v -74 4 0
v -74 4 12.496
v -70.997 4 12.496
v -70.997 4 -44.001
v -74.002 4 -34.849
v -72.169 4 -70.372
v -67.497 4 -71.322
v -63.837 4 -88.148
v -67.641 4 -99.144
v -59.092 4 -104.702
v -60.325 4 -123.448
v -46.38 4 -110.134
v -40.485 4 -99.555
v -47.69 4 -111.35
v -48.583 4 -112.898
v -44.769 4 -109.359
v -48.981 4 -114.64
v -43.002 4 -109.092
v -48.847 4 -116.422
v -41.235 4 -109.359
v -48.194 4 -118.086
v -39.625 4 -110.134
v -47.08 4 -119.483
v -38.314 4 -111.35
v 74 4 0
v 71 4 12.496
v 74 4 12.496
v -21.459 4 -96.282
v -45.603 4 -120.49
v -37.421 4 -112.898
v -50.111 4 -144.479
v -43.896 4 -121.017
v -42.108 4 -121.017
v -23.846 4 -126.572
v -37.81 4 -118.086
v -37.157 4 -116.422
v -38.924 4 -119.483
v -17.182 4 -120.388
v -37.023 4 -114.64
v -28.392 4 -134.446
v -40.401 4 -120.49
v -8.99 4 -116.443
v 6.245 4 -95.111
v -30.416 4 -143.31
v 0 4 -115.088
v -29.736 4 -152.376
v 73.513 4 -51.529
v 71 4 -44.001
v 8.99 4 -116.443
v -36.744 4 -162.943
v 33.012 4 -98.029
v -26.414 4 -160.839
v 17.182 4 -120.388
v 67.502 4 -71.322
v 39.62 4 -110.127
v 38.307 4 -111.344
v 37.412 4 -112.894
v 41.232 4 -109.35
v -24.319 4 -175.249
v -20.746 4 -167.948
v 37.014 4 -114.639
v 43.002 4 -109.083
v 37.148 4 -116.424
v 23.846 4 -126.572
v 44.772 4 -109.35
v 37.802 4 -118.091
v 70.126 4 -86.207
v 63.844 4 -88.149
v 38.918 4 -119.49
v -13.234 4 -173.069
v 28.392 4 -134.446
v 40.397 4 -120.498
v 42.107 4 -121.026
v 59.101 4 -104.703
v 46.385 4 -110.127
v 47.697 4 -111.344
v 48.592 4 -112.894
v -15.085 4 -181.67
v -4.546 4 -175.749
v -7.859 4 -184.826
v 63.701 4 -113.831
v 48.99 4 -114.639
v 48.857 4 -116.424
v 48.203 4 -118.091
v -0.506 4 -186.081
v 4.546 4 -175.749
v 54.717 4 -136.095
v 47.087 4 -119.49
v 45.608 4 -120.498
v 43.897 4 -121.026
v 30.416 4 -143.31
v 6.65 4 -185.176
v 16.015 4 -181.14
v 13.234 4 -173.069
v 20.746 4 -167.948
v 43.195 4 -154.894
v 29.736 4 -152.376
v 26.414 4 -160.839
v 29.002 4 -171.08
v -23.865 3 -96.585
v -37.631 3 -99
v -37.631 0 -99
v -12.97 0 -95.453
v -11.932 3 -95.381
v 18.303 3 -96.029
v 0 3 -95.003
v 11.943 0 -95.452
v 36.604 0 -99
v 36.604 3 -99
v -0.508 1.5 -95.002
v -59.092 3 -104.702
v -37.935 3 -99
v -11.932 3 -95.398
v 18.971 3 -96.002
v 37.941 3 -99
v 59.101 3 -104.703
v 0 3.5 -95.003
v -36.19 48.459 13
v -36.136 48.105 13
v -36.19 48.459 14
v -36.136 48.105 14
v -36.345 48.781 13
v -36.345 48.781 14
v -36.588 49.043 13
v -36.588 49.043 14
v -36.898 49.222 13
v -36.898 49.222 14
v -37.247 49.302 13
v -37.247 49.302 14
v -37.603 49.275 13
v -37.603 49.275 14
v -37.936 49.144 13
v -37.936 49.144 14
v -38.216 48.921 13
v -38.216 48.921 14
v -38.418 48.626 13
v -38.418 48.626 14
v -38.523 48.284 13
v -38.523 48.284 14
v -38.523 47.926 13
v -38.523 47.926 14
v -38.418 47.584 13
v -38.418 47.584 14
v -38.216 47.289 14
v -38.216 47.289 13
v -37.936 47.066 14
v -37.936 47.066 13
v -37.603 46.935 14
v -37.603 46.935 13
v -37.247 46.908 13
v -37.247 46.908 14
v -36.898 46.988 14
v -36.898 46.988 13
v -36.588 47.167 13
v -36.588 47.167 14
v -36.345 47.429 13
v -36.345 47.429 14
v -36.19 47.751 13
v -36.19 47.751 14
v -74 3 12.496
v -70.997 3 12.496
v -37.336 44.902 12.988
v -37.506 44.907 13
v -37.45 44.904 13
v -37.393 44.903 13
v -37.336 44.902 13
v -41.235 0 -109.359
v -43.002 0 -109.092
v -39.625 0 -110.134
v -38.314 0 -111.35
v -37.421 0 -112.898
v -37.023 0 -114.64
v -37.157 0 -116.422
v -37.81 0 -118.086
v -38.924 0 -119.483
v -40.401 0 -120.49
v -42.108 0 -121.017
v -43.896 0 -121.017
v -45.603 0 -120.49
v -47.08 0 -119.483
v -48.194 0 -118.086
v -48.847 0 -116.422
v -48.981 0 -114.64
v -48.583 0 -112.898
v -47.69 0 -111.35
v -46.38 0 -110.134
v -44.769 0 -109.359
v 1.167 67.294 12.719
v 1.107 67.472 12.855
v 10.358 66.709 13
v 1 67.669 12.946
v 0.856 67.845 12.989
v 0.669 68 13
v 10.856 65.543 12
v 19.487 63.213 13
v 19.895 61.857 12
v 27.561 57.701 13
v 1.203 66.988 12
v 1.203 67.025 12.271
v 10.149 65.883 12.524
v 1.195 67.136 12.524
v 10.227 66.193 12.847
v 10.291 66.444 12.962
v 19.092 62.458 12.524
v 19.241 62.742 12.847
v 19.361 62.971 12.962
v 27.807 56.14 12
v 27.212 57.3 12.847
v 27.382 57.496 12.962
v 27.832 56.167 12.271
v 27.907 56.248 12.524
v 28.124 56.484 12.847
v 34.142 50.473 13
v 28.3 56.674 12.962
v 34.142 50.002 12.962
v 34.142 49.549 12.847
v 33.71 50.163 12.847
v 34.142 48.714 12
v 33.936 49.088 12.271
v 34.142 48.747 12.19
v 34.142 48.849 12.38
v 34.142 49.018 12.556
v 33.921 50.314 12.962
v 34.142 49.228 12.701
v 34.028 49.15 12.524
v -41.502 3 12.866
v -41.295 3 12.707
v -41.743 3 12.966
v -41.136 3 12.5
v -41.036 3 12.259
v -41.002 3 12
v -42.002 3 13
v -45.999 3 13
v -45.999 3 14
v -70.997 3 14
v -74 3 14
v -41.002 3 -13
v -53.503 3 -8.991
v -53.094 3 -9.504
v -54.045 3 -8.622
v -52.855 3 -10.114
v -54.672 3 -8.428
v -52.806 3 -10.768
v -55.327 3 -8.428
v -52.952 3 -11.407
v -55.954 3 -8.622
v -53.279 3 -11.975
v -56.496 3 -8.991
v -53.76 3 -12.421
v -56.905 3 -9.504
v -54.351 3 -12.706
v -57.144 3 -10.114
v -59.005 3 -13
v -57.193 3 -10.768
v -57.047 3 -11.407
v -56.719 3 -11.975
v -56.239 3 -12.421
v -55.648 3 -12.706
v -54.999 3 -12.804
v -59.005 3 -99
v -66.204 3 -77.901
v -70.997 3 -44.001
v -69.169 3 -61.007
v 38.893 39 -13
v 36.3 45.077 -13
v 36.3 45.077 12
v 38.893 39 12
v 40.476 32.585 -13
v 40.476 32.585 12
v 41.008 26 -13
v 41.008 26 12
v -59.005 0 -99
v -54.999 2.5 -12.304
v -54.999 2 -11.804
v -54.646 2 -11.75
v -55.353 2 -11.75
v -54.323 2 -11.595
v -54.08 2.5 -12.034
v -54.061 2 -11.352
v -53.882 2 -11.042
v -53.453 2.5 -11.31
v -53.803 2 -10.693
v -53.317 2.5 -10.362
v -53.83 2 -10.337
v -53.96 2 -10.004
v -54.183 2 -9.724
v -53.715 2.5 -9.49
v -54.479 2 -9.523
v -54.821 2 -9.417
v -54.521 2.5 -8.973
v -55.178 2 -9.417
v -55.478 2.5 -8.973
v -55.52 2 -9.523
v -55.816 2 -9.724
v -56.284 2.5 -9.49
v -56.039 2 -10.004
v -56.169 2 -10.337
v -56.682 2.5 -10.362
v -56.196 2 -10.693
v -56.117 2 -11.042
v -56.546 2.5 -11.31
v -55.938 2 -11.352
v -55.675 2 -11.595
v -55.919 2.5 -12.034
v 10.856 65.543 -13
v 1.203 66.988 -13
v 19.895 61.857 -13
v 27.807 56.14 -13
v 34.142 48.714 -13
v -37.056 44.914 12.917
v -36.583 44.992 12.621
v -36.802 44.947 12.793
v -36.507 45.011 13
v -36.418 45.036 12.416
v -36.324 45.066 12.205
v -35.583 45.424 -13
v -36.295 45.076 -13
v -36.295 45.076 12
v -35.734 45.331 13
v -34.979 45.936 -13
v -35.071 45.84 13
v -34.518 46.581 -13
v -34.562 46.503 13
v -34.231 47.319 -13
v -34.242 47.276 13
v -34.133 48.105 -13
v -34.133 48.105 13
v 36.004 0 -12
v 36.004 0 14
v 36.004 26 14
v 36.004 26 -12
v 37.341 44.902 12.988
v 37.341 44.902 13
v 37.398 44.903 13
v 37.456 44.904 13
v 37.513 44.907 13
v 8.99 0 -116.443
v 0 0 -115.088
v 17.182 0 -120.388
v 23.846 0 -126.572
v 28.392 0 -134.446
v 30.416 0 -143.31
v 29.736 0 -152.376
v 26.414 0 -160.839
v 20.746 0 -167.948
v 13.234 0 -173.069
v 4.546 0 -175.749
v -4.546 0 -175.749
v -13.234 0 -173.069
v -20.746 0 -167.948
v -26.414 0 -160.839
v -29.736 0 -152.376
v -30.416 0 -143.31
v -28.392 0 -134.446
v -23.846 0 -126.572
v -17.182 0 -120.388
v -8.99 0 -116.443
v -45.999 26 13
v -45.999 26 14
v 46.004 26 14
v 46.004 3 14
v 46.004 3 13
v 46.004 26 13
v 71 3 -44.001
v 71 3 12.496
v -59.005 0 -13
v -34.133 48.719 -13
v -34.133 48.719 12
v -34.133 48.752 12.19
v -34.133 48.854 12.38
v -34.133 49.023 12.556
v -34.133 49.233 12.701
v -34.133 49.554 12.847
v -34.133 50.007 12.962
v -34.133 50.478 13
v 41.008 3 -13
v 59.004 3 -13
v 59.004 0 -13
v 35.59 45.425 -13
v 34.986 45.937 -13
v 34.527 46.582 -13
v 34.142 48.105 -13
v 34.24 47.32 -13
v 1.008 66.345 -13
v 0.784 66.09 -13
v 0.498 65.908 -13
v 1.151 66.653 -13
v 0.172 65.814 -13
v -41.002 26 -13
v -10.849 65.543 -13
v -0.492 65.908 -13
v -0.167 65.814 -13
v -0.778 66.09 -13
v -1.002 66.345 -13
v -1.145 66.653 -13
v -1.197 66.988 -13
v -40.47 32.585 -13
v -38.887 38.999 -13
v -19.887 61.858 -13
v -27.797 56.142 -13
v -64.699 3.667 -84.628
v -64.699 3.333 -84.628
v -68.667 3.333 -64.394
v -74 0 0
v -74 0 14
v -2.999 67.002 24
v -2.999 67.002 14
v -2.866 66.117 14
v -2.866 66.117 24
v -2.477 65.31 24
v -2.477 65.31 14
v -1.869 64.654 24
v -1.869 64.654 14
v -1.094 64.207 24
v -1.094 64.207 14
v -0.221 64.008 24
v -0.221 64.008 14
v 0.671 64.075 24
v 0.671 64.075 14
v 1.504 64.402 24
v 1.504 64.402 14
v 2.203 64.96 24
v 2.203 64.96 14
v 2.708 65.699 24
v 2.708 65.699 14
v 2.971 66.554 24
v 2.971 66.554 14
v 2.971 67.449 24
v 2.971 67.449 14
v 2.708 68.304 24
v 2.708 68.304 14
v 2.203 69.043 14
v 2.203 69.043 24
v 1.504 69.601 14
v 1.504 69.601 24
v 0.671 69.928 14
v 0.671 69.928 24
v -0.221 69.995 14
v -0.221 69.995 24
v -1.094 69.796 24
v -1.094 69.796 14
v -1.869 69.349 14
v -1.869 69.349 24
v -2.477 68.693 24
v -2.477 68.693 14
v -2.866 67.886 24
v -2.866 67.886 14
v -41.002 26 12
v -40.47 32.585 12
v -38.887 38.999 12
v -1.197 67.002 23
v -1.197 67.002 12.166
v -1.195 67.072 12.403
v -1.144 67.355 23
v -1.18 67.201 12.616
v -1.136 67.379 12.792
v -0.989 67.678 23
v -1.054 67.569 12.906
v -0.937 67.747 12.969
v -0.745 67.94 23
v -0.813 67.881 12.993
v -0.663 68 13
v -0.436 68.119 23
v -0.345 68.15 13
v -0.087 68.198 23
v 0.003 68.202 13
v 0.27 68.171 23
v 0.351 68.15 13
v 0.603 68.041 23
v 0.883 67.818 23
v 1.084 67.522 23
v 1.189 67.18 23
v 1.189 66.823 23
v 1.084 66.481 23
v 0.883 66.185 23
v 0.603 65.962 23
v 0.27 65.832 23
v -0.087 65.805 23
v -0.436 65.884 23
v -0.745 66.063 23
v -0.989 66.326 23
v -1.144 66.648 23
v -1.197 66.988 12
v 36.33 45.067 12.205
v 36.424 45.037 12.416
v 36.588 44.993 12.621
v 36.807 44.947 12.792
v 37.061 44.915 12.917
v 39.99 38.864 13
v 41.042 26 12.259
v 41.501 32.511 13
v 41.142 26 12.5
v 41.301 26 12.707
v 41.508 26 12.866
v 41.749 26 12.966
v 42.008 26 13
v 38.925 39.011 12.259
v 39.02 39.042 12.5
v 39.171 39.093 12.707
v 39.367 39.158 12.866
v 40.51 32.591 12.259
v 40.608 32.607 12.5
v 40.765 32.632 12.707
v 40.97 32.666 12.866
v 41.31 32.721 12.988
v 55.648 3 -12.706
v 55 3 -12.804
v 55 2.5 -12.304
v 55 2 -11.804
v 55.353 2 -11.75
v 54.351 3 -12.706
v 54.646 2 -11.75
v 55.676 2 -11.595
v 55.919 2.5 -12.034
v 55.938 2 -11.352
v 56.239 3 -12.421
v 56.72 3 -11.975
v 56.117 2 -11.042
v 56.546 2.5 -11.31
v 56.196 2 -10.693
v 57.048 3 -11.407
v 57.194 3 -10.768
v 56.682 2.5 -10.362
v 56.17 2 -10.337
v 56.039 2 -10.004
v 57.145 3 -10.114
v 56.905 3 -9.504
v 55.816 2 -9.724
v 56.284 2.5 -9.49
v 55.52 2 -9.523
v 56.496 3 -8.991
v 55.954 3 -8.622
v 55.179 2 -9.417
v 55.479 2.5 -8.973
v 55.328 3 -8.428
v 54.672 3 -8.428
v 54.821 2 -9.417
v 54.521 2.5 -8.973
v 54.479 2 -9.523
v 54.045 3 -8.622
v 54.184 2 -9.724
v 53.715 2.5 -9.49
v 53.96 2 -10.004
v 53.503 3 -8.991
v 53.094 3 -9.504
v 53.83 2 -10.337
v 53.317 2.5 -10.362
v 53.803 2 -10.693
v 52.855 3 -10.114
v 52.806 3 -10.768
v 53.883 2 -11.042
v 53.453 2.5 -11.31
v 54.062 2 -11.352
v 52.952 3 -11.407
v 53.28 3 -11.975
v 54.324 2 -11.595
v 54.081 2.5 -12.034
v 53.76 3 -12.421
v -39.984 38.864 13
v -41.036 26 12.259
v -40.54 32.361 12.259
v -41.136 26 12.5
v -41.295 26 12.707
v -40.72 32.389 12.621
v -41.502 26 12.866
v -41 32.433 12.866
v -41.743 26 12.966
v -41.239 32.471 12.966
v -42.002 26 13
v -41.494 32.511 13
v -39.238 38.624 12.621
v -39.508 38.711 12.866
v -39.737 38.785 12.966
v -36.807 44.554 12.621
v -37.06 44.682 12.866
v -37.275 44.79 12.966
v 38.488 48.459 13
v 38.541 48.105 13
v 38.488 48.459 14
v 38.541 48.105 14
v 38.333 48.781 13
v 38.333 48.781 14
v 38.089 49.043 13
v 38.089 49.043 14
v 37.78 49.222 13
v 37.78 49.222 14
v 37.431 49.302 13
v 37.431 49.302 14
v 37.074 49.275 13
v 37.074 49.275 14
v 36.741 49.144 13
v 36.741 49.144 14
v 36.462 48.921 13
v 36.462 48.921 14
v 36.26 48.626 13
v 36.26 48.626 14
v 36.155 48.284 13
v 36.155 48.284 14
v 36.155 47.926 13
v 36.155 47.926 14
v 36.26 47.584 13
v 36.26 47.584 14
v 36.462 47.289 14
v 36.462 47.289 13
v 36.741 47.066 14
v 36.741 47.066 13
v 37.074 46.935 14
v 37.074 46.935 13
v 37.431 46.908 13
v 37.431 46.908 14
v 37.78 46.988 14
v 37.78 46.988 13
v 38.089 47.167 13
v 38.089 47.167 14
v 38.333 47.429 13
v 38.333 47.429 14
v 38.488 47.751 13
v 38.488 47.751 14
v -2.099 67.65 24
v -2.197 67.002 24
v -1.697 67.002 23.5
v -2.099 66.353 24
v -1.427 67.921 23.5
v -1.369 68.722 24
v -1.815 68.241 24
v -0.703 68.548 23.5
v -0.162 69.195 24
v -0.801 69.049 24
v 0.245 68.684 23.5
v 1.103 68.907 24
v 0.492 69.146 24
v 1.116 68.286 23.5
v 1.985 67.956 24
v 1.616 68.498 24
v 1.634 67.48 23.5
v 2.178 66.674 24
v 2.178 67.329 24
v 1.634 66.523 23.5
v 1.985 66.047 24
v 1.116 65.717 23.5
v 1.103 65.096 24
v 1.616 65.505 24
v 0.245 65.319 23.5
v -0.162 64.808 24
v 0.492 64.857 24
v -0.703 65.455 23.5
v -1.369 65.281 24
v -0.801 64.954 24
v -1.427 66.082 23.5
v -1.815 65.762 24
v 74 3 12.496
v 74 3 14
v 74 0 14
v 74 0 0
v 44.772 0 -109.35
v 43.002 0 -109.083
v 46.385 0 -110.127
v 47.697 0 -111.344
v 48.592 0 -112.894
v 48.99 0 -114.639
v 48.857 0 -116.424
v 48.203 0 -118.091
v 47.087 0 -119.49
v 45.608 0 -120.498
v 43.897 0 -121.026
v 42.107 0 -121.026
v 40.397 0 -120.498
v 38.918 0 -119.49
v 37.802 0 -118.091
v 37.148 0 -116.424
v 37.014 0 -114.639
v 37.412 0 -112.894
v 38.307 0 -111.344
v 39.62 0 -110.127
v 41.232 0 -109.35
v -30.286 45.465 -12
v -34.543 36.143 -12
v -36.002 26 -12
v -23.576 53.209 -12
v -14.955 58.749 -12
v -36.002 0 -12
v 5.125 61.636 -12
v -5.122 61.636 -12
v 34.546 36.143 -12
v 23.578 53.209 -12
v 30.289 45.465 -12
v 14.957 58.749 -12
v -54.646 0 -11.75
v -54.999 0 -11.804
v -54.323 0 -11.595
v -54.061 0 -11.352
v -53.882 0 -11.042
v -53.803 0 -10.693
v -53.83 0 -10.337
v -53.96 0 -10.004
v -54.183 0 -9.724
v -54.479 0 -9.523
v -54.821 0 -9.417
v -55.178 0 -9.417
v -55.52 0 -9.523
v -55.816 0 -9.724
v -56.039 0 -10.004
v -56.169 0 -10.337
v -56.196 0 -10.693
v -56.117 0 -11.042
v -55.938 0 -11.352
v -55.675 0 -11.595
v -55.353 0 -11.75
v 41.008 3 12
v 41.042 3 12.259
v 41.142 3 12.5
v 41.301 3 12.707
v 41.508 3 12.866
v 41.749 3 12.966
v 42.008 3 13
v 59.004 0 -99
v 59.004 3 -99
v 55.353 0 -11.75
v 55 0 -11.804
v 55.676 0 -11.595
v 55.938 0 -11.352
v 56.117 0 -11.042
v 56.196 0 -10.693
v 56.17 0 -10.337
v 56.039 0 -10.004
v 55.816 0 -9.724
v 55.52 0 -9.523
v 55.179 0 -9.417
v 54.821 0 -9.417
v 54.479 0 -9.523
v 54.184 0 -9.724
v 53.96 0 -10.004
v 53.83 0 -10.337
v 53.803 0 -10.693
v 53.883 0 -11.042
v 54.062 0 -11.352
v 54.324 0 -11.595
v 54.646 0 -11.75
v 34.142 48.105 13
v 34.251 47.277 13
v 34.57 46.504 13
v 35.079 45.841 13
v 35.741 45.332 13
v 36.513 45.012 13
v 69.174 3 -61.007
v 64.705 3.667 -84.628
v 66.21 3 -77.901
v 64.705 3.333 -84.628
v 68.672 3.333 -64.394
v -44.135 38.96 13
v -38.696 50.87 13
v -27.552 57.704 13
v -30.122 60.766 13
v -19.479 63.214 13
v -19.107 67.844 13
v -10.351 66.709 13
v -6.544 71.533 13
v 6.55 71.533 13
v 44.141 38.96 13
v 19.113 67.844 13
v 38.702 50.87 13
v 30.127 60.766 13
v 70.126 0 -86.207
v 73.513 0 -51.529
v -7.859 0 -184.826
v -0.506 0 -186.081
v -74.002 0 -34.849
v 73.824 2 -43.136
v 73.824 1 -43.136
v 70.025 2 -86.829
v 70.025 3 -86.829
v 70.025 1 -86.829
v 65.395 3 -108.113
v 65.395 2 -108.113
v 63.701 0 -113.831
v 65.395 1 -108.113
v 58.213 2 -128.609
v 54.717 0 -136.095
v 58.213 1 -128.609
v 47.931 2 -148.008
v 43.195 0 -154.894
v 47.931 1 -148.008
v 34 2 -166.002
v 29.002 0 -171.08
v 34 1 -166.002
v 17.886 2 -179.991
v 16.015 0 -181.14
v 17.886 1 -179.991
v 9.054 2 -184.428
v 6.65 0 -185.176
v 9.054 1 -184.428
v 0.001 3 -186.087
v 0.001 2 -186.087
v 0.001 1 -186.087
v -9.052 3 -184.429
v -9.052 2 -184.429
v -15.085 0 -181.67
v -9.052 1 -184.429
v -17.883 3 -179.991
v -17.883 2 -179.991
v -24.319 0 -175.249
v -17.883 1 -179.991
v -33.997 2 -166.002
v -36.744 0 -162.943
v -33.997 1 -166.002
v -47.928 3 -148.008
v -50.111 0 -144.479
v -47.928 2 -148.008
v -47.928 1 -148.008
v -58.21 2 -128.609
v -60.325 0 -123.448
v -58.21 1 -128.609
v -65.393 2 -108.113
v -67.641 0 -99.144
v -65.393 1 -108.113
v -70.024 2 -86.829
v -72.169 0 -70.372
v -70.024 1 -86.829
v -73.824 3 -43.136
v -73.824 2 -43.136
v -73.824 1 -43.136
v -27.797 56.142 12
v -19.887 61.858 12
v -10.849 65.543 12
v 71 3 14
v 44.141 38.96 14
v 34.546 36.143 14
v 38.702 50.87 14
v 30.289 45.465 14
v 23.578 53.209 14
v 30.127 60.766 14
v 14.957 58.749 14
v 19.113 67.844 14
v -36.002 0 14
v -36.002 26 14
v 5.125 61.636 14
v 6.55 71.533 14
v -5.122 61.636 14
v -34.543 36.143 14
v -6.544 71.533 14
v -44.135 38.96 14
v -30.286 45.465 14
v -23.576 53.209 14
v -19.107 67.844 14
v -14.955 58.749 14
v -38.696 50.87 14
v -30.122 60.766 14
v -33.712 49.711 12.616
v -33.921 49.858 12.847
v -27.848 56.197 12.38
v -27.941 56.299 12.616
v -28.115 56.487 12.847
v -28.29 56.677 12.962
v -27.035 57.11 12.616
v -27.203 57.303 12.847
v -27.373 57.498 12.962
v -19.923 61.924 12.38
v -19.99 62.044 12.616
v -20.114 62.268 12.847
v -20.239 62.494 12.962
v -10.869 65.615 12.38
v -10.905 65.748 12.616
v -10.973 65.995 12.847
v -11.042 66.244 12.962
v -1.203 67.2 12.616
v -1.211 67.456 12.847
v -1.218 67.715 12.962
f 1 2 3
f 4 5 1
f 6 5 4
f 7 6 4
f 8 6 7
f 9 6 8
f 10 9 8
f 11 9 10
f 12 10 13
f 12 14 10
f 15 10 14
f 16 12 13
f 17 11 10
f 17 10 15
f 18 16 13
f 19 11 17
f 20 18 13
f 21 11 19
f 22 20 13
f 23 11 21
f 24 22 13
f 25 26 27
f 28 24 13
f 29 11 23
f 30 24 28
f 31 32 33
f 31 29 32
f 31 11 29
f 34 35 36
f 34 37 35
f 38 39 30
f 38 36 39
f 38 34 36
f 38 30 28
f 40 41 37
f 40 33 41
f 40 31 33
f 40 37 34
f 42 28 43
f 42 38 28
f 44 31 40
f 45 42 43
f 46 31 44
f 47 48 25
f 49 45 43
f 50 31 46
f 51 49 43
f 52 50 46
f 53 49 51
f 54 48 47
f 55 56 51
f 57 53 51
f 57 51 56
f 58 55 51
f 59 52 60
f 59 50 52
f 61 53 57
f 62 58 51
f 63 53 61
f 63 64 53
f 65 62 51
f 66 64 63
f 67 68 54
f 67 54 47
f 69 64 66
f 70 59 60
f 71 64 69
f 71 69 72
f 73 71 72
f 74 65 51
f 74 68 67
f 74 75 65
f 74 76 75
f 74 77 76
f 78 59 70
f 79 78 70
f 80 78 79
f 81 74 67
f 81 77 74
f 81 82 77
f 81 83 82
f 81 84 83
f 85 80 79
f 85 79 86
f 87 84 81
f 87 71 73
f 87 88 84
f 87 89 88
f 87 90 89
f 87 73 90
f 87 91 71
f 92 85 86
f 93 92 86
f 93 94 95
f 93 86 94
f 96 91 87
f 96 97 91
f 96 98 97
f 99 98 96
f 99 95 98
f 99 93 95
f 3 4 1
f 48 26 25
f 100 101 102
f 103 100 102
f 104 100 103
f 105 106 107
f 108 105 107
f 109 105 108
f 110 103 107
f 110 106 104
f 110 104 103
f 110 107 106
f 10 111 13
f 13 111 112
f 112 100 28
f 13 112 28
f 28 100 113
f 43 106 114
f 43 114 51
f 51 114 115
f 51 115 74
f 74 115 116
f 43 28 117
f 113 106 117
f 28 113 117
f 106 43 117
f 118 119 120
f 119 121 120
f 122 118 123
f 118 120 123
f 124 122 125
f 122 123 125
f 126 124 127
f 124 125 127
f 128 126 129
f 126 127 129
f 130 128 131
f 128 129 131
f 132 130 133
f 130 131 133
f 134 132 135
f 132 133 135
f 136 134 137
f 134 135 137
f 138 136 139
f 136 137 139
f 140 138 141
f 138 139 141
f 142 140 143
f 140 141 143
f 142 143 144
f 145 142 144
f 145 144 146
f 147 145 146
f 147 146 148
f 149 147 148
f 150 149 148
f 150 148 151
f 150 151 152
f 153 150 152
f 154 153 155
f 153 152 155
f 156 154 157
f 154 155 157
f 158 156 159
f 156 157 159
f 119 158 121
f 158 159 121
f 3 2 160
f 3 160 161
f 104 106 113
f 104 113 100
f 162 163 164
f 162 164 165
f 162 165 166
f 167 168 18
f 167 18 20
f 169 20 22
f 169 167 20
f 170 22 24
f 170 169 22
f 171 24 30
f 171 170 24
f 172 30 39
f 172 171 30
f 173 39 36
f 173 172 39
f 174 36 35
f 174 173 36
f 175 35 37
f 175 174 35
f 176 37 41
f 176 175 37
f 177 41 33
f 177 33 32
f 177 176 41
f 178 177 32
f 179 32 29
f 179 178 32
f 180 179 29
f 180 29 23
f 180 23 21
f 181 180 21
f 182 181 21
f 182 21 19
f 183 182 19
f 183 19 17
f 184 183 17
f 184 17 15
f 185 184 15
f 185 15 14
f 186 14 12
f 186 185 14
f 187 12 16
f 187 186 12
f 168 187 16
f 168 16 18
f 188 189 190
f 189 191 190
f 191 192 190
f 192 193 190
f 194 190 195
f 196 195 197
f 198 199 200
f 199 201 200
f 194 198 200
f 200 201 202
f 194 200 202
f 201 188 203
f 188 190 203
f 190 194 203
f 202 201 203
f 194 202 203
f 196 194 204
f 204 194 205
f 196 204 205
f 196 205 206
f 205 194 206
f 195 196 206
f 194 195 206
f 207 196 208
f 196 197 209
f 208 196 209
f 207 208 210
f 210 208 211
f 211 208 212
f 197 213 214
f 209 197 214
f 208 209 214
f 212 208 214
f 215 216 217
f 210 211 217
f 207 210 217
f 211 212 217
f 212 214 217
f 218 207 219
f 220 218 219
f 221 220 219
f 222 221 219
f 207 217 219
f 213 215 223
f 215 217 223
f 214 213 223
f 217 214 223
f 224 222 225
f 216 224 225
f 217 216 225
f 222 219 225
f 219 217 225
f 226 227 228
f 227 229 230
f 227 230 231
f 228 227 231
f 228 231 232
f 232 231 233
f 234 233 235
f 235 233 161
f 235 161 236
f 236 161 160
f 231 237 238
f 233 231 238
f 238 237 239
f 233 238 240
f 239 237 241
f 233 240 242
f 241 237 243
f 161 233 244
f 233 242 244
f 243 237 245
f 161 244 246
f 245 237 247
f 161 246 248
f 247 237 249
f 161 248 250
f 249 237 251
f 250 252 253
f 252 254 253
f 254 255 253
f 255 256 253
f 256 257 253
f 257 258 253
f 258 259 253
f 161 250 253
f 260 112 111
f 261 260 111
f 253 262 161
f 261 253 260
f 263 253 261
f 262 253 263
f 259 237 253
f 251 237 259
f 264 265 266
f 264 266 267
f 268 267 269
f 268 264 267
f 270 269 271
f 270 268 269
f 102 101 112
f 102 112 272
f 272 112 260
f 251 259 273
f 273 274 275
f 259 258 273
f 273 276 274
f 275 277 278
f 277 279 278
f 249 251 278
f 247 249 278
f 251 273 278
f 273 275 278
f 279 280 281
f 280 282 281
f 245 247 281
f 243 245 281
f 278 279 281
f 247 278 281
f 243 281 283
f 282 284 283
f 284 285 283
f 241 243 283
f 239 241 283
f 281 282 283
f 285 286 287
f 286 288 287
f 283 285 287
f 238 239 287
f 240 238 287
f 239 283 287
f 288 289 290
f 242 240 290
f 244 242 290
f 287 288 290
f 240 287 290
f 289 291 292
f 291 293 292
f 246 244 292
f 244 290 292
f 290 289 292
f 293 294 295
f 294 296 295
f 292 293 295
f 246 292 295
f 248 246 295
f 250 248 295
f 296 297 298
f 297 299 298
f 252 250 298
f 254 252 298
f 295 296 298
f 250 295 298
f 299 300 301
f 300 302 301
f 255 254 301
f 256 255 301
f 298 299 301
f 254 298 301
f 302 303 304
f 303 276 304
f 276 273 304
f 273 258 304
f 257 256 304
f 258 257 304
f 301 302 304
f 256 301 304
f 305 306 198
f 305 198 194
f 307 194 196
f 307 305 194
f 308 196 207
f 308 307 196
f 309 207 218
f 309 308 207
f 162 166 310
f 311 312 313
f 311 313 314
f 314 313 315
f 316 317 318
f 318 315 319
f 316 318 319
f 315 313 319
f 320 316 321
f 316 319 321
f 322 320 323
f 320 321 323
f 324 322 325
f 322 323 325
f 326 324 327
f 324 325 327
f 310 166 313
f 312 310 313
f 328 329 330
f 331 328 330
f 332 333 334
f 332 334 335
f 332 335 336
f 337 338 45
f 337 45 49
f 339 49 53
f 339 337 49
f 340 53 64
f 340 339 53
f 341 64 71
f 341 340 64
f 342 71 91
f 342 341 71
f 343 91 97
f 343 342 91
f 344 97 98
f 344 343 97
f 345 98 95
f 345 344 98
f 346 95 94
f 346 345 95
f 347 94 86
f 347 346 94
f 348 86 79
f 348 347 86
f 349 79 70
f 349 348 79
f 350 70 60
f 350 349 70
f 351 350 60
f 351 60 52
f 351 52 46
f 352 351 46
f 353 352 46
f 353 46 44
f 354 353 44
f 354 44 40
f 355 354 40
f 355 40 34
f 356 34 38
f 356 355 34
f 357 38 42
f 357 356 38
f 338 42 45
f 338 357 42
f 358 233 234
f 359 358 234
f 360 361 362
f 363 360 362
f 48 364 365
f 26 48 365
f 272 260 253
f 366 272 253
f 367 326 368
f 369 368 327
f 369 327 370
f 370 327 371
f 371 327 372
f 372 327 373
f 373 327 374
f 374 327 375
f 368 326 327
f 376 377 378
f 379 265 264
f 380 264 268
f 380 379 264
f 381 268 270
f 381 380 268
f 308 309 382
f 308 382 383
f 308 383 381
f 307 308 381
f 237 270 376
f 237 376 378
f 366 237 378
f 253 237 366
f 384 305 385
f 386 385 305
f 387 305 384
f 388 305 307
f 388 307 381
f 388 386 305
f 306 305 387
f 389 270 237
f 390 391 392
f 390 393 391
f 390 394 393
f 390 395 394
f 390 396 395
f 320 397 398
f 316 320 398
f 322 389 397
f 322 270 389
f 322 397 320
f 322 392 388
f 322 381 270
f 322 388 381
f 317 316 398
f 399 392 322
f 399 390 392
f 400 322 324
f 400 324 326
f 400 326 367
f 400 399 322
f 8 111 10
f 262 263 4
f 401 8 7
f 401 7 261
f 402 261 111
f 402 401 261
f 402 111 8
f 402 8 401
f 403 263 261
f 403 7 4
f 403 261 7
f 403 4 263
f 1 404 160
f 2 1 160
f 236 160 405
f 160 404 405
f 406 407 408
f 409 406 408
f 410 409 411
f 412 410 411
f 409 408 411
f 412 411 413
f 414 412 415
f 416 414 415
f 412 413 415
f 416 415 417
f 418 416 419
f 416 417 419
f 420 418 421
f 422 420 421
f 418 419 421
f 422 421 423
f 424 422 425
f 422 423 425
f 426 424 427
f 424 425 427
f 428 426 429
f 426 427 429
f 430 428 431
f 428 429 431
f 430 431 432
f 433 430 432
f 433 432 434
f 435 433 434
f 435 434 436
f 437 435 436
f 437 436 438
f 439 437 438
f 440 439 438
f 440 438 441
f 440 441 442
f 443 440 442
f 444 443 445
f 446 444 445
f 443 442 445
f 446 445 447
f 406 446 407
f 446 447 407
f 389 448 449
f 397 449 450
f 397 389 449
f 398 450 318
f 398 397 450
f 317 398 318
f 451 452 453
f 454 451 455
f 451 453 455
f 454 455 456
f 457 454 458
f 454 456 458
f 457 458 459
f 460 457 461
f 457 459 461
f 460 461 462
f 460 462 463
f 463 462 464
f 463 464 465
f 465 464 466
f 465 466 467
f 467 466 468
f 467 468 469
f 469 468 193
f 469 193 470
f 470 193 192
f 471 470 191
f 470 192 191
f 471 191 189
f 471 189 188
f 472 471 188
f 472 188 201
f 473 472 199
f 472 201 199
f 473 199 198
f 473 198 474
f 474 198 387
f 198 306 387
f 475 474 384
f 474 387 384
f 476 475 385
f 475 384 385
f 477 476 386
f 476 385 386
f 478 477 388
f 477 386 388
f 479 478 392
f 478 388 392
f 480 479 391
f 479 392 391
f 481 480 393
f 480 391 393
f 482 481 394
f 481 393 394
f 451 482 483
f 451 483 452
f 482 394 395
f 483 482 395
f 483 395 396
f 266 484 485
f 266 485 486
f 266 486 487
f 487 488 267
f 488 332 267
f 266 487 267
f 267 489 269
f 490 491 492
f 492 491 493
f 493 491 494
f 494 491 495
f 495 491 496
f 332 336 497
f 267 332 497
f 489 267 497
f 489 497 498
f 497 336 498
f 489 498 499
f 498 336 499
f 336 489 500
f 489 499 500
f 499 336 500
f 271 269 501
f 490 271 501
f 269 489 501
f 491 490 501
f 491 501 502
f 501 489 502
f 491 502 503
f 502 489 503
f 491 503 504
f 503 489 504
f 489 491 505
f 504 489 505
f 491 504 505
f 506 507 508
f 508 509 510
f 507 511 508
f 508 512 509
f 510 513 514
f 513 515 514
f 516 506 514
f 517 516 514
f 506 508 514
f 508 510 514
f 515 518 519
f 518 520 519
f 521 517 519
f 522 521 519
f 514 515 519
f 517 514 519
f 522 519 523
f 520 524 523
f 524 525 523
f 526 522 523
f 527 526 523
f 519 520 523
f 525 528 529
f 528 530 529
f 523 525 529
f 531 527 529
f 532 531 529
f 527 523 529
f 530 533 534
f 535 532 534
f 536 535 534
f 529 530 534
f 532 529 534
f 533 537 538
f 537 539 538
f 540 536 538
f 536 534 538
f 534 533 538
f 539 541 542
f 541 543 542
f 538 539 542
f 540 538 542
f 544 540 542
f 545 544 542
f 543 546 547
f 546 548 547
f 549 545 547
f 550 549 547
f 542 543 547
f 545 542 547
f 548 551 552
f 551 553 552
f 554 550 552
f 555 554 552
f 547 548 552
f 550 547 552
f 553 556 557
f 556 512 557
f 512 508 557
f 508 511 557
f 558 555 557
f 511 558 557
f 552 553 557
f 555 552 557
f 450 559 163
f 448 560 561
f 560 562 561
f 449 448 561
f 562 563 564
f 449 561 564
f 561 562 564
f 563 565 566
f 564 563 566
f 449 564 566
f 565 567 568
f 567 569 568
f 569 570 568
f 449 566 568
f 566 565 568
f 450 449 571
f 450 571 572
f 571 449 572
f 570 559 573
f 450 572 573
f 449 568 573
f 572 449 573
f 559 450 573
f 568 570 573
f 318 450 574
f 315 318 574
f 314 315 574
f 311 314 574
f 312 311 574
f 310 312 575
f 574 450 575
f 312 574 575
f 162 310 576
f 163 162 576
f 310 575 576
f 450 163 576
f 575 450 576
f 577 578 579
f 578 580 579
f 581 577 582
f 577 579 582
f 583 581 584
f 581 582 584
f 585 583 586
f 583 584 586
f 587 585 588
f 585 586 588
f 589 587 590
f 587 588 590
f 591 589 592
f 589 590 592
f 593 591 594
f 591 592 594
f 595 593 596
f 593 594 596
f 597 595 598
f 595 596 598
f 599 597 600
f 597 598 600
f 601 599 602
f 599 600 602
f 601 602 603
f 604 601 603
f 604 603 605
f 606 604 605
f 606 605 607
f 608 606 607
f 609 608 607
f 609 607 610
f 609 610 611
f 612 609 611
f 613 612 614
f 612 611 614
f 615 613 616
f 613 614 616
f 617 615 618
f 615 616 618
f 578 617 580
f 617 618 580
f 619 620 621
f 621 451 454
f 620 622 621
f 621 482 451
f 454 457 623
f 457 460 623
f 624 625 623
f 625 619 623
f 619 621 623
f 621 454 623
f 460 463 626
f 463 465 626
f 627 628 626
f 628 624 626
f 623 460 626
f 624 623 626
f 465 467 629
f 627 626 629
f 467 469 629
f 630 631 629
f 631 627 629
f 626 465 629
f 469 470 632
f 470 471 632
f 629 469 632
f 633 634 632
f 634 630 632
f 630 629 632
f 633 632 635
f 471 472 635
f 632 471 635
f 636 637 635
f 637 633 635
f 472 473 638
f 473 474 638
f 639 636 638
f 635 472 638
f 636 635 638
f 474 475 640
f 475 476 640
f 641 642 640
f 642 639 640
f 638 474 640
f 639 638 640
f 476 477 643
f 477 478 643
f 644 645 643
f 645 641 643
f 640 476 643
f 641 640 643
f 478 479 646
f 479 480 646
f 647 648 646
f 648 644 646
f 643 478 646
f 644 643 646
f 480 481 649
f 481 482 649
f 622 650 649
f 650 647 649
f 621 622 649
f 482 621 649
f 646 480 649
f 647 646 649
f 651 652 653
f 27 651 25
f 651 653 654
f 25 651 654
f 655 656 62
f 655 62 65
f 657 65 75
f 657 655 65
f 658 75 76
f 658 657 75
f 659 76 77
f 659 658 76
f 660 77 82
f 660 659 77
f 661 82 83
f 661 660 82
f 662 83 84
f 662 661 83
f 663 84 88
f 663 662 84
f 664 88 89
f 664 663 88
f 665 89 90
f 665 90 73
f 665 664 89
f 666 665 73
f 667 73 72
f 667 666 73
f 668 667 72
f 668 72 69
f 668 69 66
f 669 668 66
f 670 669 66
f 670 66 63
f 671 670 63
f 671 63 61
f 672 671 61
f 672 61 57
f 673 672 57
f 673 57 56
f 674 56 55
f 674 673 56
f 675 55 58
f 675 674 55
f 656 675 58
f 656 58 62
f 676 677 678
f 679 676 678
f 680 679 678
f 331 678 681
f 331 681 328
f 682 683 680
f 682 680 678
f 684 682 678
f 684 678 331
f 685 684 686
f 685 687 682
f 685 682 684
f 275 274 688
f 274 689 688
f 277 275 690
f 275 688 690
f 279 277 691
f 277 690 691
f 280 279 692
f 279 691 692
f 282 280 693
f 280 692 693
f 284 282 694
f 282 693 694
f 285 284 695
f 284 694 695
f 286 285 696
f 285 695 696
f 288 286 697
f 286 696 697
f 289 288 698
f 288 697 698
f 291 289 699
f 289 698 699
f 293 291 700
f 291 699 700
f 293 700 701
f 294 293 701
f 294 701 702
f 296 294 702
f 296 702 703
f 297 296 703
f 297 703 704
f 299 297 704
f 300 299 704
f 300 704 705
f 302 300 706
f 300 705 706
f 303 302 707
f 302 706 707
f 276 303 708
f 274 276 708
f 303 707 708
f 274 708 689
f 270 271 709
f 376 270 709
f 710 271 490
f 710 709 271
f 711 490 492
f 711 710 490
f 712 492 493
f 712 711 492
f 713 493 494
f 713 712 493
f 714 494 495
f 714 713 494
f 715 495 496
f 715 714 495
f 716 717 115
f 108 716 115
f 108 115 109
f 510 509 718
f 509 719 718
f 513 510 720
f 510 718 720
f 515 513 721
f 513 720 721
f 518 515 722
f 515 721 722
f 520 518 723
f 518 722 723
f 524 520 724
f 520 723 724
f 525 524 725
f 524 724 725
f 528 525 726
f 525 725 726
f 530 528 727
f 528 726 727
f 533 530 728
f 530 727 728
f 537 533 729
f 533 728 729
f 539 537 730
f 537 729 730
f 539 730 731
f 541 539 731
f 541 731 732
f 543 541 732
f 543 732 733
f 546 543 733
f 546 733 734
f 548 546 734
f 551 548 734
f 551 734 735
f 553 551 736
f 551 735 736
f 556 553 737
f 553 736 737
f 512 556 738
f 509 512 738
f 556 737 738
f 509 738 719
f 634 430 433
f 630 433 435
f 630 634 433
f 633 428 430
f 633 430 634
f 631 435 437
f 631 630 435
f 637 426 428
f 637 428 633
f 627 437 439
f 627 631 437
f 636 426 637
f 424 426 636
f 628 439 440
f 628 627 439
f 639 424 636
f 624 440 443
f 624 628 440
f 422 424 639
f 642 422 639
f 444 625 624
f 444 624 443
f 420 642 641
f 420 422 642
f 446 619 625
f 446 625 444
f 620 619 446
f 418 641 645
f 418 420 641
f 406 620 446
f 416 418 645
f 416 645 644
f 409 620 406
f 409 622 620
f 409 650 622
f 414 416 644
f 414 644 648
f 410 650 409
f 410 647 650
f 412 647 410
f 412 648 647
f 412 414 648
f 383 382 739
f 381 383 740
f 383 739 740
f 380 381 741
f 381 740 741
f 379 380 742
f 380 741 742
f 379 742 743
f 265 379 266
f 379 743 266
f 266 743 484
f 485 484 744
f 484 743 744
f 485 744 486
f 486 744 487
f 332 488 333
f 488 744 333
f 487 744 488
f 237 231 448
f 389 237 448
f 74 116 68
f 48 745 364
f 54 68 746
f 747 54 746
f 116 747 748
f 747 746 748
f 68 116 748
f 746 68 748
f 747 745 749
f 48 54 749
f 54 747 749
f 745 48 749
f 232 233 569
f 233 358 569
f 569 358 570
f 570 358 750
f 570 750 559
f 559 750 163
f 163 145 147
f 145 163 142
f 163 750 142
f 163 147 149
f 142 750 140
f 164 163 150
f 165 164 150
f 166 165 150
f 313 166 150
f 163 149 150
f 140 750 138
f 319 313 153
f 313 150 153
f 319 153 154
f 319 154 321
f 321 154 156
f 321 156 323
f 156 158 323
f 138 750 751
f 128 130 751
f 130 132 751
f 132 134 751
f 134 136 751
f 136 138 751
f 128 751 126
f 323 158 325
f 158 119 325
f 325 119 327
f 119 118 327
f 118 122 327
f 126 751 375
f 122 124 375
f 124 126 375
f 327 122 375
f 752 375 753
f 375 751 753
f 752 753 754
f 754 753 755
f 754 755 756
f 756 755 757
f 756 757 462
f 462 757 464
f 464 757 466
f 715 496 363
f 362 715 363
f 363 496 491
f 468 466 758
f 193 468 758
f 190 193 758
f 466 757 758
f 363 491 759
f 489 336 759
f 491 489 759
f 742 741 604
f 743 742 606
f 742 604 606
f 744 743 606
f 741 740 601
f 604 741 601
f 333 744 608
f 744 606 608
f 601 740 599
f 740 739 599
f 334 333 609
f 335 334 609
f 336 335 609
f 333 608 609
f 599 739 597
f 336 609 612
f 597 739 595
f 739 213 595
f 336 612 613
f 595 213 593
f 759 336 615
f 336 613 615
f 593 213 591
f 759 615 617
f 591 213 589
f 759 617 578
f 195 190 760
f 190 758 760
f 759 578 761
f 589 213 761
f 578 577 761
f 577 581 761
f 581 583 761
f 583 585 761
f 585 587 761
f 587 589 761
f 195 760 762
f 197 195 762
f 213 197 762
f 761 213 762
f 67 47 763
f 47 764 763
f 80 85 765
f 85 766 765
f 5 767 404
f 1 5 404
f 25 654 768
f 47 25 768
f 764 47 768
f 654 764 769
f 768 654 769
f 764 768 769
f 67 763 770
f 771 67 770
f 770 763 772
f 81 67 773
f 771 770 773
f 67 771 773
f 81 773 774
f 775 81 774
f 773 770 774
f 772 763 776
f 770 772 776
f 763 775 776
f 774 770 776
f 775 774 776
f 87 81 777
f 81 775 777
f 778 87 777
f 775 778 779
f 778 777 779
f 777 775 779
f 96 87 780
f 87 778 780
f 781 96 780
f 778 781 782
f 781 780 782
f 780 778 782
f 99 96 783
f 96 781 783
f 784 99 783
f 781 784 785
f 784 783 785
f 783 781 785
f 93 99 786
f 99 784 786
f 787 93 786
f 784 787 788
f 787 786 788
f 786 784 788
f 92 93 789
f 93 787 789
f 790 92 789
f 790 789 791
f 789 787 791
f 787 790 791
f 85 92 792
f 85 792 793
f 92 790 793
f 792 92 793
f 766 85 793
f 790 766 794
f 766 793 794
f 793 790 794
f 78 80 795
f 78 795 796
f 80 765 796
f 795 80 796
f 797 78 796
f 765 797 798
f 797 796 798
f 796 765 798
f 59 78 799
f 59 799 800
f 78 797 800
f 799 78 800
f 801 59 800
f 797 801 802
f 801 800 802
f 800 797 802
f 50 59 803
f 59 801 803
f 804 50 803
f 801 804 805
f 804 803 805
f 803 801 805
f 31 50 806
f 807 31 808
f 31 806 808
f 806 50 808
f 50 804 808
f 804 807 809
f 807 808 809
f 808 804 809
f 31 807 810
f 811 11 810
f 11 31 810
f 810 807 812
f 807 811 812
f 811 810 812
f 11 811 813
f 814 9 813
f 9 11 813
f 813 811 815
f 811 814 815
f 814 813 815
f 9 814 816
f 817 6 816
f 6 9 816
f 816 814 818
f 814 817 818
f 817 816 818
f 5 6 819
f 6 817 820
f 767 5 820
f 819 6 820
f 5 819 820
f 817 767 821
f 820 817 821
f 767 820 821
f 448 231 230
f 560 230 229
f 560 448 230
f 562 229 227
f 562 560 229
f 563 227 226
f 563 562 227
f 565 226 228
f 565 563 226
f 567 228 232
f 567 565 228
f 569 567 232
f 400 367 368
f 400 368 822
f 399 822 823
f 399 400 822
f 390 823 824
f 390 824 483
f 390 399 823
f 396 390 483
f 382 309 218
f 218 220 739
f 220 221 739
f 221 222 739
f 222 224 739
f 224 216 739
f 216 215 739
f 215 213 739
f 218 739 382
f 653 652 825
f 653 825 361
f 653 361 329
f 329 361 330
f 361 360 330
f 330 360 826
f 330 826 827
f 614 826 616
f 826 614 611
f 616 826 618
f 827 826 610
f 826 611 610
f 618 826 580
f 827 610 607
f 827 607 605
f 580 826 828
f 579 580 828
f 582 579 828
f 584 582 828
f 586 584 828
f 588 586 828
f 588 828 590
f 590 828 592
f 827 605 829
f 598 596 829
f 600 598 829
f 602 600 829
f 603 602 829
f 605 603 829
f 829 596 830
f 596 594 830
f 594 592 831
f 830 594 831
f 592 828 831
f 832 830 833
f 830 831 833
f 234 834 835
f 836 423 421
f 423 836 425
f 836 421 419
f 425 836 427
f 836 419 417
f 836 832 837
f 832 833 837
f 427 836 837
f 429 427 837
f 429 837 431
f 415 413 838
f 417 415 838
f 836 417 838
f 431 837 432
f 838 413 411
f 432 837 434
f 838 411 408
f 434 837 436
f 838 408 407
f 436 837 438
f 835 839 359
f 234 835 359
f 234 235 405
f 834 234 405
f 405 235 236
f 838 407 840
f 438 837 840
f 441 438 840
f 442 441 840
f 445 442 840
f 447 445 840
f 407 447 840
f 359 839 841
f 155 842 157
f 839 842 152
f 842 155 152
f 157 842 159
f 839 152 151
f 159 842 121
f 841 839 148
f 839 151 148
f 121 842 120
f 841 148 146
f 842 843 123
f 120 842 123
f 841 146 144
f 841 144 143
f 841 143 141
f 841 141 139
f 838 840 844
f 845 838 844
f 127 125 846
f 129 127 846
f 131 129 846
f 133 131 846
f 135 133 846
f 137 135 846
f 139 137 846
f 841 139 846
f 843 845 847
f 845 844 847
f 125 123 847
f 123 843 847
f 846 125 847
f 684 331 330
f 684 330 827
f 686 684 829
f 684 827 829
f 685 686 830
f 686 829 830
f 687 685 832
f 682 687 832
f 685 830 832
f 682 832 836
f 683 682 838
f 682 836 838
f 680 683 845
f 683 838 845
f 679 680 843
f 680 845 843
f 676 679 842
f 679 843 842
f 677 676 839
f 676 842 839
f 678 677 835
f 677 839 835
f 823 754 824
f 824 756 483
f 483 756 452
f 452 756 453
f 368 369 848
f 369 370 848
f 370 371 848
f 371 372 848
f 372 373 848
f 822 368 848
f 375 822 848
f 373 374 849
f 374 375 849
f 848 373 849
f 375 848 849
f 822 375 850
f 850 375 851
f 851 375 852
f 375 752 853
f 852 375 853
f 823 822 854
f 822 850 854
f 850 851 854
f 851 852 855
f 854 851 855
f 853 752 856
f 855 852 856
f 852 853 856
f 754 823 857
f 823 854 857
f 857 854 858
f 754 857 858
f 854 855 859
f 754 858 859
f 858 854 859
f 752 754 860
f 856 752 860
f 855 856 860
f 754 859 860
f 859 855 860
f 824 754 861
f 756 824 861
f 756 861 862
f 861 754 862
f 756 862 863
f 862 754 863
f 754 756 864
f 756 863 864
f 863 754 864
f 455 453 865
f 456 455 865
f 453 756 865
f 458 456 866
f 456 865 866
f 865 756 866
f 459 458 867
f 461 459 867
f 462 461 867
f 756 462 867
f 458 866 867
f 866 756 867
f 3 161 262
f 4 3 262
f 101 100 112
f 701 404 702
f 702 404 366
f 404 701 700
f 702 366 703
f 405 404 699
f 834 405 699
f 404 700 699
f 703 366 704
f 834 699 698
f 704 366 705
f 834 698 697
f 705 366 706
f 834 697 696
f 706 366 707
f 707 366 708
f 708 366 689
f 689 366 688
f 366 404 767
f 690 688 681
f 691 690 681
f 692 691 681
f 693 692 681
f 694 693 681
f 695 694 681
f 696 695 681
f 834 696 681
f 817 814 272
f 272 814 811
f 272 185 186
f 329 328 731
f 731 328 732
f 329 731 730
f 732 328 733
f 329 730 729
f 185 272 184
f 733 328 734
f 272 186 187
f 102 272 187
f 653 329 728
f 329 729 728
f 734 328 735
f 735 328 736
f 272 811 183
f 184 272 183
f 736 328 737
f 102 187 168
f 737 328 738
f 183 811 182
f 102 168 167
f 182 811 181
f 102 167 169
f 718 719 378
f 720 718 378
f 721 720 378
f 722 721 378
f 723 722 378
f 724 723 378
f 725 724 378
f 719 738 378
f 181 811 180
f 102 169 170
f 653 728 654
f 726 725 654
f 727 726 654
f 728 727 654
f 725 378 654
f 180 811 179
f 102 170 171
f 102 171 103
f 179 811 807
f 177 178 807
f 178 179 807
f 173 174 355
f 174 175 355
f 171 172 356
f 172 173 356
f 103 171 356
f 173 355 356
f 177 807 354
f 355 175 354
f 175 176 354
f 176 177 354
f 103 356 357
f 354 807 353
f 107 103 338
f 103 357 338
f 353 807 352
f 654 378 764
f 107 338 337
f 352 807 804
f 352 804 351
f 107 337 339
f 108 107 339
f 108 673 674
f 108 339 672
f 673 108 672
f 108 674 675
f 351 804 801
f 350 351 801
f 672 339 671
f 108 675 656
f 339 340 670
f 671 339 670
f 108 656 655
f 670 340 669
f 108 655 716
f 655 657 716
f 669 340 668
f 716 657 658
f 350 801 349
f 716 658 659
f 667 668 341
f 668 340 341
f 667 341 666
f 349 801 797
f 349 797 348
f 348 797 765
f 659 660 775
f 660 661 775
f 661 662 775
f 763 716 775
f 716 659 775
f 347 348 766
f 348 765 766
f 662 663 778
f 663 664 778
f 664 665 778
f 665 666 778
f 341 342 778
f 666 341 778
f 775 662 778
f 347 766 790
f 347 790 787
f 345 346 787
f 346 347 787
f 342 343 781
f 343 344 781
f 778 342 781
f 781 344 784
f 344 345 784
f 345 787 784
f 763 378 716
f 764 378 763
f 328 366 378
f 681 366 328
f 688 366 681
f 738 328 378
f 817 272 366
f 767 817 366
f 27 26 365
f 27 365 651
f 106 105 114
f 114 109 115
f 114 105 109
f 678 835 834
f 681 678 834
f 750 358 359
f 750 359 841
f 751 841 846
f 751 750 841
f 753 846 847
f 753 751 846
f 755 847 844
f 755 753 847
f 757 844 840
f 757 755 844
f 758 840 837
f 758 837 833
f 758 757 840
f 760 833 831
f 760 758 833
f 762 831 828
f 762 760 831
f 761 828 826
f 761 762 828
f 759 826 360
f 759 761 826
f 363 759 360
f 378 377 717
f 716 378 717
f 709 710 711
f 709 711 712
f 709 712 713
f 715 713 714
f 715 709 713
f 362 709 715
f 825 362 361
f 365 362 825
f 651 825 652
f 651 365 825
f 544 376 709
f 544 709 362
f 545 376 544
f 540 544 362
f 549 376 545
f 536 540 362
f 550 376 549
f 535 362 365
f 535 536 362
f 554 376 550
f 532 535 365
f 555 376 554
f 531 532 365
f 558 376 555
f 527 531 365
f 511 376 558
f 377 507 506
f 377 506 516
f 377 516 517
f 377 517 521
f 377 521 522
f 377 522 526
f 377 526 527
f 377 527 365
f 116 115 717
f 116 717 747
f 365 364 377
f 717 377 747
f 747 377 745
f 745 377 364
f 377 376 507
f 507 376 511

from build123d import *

# Parameters (mm, degrees)
SKETCH3_R                                            = 30.500804908
SKETCH3_R_2                                          = 5.995731032
SKETCH3_R_3                                          = 6.004912971
BOSS_EXTRUDE1_DEPTH                                  = 4
CUT_EXTRUDE1_DEPTH                                   = 201.334085664
CUT_EXTRUDE1_DEPTH_BACK                              = 1
CUT_EXTRUDE2_DEPTH                                   = 10
BOSS_EXTRUDE2_DEPTH                                  = 23
SKETCH8_W                                            = 46.001518713
SKETCH8_H                                            = 27
REVOLVE1_ANGLE                                       = 180
CUT_EXTRUDE3_DEPTH                                   = 26
FILLET1_R                                            = 1
CSK_FOR_M2_COUNTERSUNK_RAISED_HEAD_SCREW_D           = 2.4
CSK_FOR_M2_COUNTERSUNK_RAISED_HEAD_SCREW_CSINK_D     = 4.4
CSK_FOR_M2_COUNTERSUNK_RAISED_HEAD_SCREW_CSINK_ANGLE = 90
CSK_FOR_M2_COUNTERSUNK_RAISED_HEAD_S_2_D             = 2.4
CSK_FOR_M2_COUNTERSUNK_RAISED_HEAD_S_2_CSINK_D       = 4.4
CSK_FOR_M2_COUNTERSUNK_RAISED_HEAD_S_2_CSINK_ANGLE   = 90
CUT_EXTRUDE4_DEPTH                                   = 26
CUT_EXTRUDE6_DEPTH                                   = 26
CSK_FOR_M2_COUNTERSUNK_RAISED_HEAD_S_3_D             = 2.4
CSK_FOR_M2_COUNTERSUNK_RAISED_HEAD_S_3_CSINK_D       = 4.4
CSK_FOR_M2_COUNTERSUNK_RAISED_HEAD_S_3_CSINK_ANGLE   = 90
SKETCH21_W                                           = 3.203626312
SKETCH21_H                                           = 1.504144349
SKETCH21_W_2                                         = 3.379717773
CUT_EXTRUDE7_DEPTH                                   = 1
SKETCH26_R                                           = 3.001958304
BOSS_EXTRUDE4_DEPTH                                  = 10
CSK_FOR_M2_COUNTERSUNK_FLAT_HEAD_SCREW1_D            = 2.4
CSK_FOR_M2_COUNTERSUNK_FLAT_HEAD_SCREW1_CSINK_D      = 4.4
CSK_FOR_M2_COUNTERSUNK_FLAT_HEAD_SCREW1_CSINK_ANGLE  = 90


with BuildPart() as part:
    # Sketch3 → Boss-Extrude1 (new body)
    with BuildSketch(Plane(origin=(0, 0, 0), x_dir=(1, 0, 0), z_dir=(0, 1, 0))):
        with BuildLine():
            Line((-74, 0), (-74, -13.999975782))
            Line((-74, -13.999975782), (74, -13.999975782))
            Line((74, -13.999975782), (74, 0))
            add(Edge.make_bspline(
                [(74, 0), (74.231196296, 56.043971303), (77.023704063, 134.891433867), (0.000522637, 195.647038294), (-77.018807985, 134.889235124), (-74.23221909, 56.044664754), (-74, 0)],
                knots=[0, 0, 0, 0, 0.406629726, 0.500002159, 0.593368057, 1, 1, 1, 1], degree=3))
        make_face()
        with Locations(Location((0, 145.588967501, 0), (0, 0, 270))):
            Circle(SKETCH3_R, mode=Mode.SUBTRACT)
        with Locations(Location((-43.002039148, 115.088162593, 0), (0, 0, 270))):
            Circle(SKETCH3_R_2, mode=Mode.SUBTRACT)
        with Locations(Location((43.002259074, 115.088162593, 0), (0, 0, 270))):
            Circle(SKETCH3_R_3, mode=Mode.SUBTRACT)
    extrude(amount=BOSS_EXTRUDE1_DEPTH)

    # Sketch4 → Cut-Extrude1 (cut, two sides: drawn at the far end of the back side and taken through both)
    with BuildSketch(Plane(origin=(0, 4, 0), x_dir=(1, 0, 0), z_dir=(0, 1, 0)).offset(-CUT_EXTRUDE1_DEPTH_BACK)):
        with BuildLine():
            Line((71.000110633, 44.001091932), (71.000110633, 6.067137952))
            Line((71.000110633, 6.067137952), (71.000110633, 5.938211201))
            Line((71.000110633, 5.938211201), (71.000110633, -16.998704323))
            Line((71.000110633, -16.998704323), (-70.996716676, -16.998704323))
            Line((-70.996716676, -16.998704323), (-70.996716676, 6.002699648))
            Line((-70.996716676, 6.002699648), (-70.996716676, 44.001117001))
            add(Edge.make_bspline(
                [(-59.092437552, 104.701767127), (-65.518680916, 84.707719391), (-69.486773958, 64.474169348), (-70.996716676, 44.001117001)],
                knots=[0.003076868, 0.003076868, 0.003076868, 0.003076868, 0.620649816, 0.620649816, 0.620649816, 0.620649816], degree=3))
            add(Edge.make_bspline(
                [(-59.092437552, 104.701767127), (-39.394984135, 98.235957793), (0.002749603, 91.769378921), (39.400586429, 98.235612751), (59.100918302, 104.702616137)],
                knots=[0.007529078, 0.007529078, 0.007529078, 0.007529078, 0.499976084, 0.992492475, 0.992492475, 0.992492475, 0.992492475], degree=3))
            add(Edge.make_bspline(
                [(59.100918302, 104.702616137), (65.524413648, 84.70806856), (69.490811091, 64.474227159), (71.000110633, 44.001091932)],
                knots=[0.003067815, 0.003067815, 0.003067815, 0.003067815, 0.620645861, 0.620645861, 0.620645861, 0.620645861], degree=3))
        make_face()
    extrude(amount=CUT_EXTRUDE1_DEPTH + CUT_EXTRUDE1_DEPTH_BACK, mode=Mode.SUBTRACT)

    # Sketch5 → Cut-Extrude2 (cut)
    with BuildSketch(Plane(origin=(0, 3, 0), x_dir=(1, 0, 0), z_dir=(0, 1, 0))):
        with BuildLine():
            Line((-37.63115667, 99.000024218), (-59.004553183, 99.000024218))
            Line((-59.004553183, 99.000024218), (-59.004553183, 13.000024218))
            Line((-59.004553183, 13.000024218), (59.003956031, 13.000024218))
            Line((59.003956031, 13.000024218), (59.003956031, 99.000024218))
            Line((59.003956031, 99.000024218), (36.603722574, 99.000024218))
            add(Edge.make_bspline(
                [(-37.63115667, 99.000024218), (-0.501932399, 91.00364322), (36.603722574, 99.000024218)],
                knots=[0, 0, 0, 1, 1, 1], degree=2))
        make_face()
    extrude(amount=-CUT_EXTRUDE2_DEPTH, mode=Mode.SUBTRACT)

    # Sketch7 → Boss-Extrude2 (add)
    with BuildSketch(Plane(origin=(0, 3, 0), x_dir=(1, 0, 0), z_dir=(0, 1, 0))):
        Polygon((-0.000298576, 13.000024218), (-45.998654577, 13.000024218), (-45.998654577, -13.999975782), (0.001696979, -13.999975782), (46.00438285, -13.999975782), (46.00438285, 13.000024218), align=None)
    extrude(amount=BOSS_EXTRUDE2_DEPTH)

    # Sketch8 → Revolve1 (revolve)
    with BuildSketch(Plane(origin=(0, 26, 0), x_dir=(1, 0, 0), z_dir=(0, 1, 0))):
        with Locations((-22.997895221, -0.499975782)):
            Rectangle(SKETCH8_W, SKETCH8_H)
    revolve(axis=Axis((0.002864136, 26, -13.000024218), (0, 0, -1)), revolution_arc=REVOLVE1_ANGLE)

    # Sketch9 → Cut-Extrude3 (cut)
    with BuildSketch(Plane(origin=(0, 0, -13.000024218), x_dir=(-1, 0, 0), z_dir=(0, 0, -1))):
        with BuildLine():
            Line((-46.00438285, 4), (-46.00438285, 26))
            ThreePointArc((-46.00438285, 26), (-0.002864136, 72.001518714), (45.998654577, 26))
            Line((45.998654577, 26), (45.998654577, 4))
            Line((45.998654577, 4), (45.998654577, 3))
            Line((45.998654577, 3), (41.002011799, 3))
            Line((41.002011799, 3), (41.002011799, 4))
            Line((41.002011799, 4), (41.002011799, 26))
            ThreePointArc((41.002011799, 26), (-0.003137153, 67.005148952), (-41.008286105, 26))
            Line((-41.008286105, 26), (-41.008286105, 4))
            Line((-41.008286105, 4), (-41.008286105, 3))
            Line((-41.008286105, 3), (-46.00438285, 3))
            Line((-46.00438285, 3), (-46.00438285, 4))
        make_face()
    extrude(amount=-CUT_EXTRUDE3_DEPTH, mode=Mode.SUBTRACT)

    # Fillet1
    fillet1_edges = [part.edges().sort_by_distance(p)[0] for p in [
        (41.008286105, 14.5, 12.999975782),
        (0.003137153, 67.005148952, 12.999975782),
        (-41.002011799, 14.5, 12.999975782),
    ]]
    fillet(fillet1_edges, radius=FILLET1_R)

    # CSK for M2 Countersunk Raised Head Screw (through all)
    with Locations(Plane(origin=(37.341283937, 48.105109247, -13.000024218), x_dir=(-1, 0, 0), z_dir=(0, 0, -1))):
        with Locations((0, 0)):
            CounterSinkHole(CSK_FOR_M2_COUNTERSUNK_RAISED_HEAD_SCREW_D / 2, CSK_FOR_M2_COUNTERSUNK_RAISED_HEAD_SCREW_CSINK_D / 2, counter_sink_angle=CSK_FOR_M2_COUNTERSUNK_RAISED_HEAD_SCREW_CSINK_ANGLE)

    # CSK for M2 Countersunk Raised Head S 2 (through all)
    with Locations(Plane(origin=(-37.336467168, 48.105109247, -13.000024218), x_dir=(-1, 0, 0), z_dir=(0, 0, -1))):
        with Locations((0, 0)):
            CounterSinkHole(CSK_FOR_M2_COUNTERSUNK_RAISED_HEAD_S_2_D / 2, CSK_FOR_M2_COUNTERSUNK_RAISED_HEAD_S_2_CSINK_D / 2, counter_sink_angle=CSK_FOR_M2_COUNTERSUNK_RAISED_HEAD_S_2_CSINK_ANGLE)

    # Sketch13 → Cut-Extrude4 (cut)
    with BuildSketch(Plane(origin=(0, 0, 12.999975782), x_dir=(-1, 0, 0), z_dir=(0, 0, -1))):
        with BuildLine():
            Line((-40.537082061, 48.105109247), (-40.537082061, 50.119729722))
            Line((-40.537082061, 50.119729722), (-34.142461411, 57.934379624))
            Line((-34.142461411, 57.934379624), (-34.142461411, 48.105109247))
            ThreePointArc((-34.142461411, 48.105109247), (-35.078534783, 45.841172076), (-37.341283937, 44.902230579))
            ThreePointArc((-37.341283937, 44.902230579), (-39.602520891, 45.84179845), (-40.537082061, 48.105109247))
        make_face()
        with BuildLine():
            Line((34.132951582, 48.105109247), (34.132951582, 58.567156979))
            Line((34.132951582, 58.567156979), (40.534839533, 50.980581359))
            Line((40.534839533, 50.980581359), (40.534839533, 48.105109247))
            ThreePointArc((40.534839533, 48.105109247), (39.59899119, 45.841265256), (37.336467022, 44.902230579))
            ThreePointArc((37.336467022, 44.902230579), (35.070804229, 45.839632847), (34.132951582, 48.105109247))
        make_face()
    extrude(amount=CUT_EXTRUDE4_DEPTH, mode=Mode.SUBTRACT)

    # Sketch14 → Cut-Extrude6 (cut)
    with BuildSketch(Plane.XY.offset(13.999975782)):
        with BuildLine():
            Line((-36.001614282, 3), (-36.001614282, -2.003280718))
            Line((-36.001614282, -2.003280718), (36.004124987, -2.003280718))
            Line((36.004124987, -2.003280718), (36.004124987, 3))
            Line((36.004124987, 3), (36.004124987, 26))
            ThreePointArc((36.004124987, 26), (0.001255352, 62.002869635), (-36.001614282, 26))
            Line((-36.001614282, 26), (-36.001614282, 3))
        make_face()
    extrude(amount=-CUT_EXTRUDE6_DEPTH, mode=Mode.SUBTRACT)

    # CSK for M2 Countersunk Raised Head S 3 (through all)
    with Locations(Plane(origin=(-54.999469482, 3, -10.603702266), x_dir=(0, 0, 1), z_dir=(0, 1, 0))):
        with Locations((0, 0), (0, 109.999191574)):
            CounterSinkHole(CSK_FOR_M2_COUNTERSUNK_RAISED_HEAD_S_3_D / 2, CSK_FOR_M2_COUNTERSUNK_RAISED_HEAD_S_3_CSINK_D / 2, counter_sink_angle=CSK_FOR_M2_COUNTERSUNK_RAISED_HEAD_S_3_CSINK_ANGLE)

    # Sketch21 → Cut-Extrude7 (cut)
    with BuildSketch(Plane(origin=(0, 4, 0), x_dir=(1, 0, 0), z_dir=(0, 1, 0))):
        with Locations((-72.598529832, -13.247903608)):
            Rectangle(SKETCH21_W, SKETCH21_H)
        with Locations((72.68996952, -13.247903608)):
            Rectangle(SKETCH21_W_2, SKETCH21_H)
    extrude(amount=-CUT_EXTRUDE7_DEPTH, mode=Mode.SUBTRACT)

    # Sketch26 → Boss-Extrude4 (add)
    with BuildSketch(Plane.XY.offset(13.999975782)):
        with Locations(Location((0.002864136, 67.001518714, 0), (0, 0, 180))):
            Circle(SKETCH26_R)
    extrude(amount=BOSS_EXTRUDE4_DEPTH)

    # CSK for M2 Countersunk Flat Head Screw1 (through all)
    with Locations(Plane.XY.offset(23.999975782)):
        with Locations((0.002864136, 67.001518714)):
            CounterSinkHole(CSK_FOR_M2_COUNTERSUNK_FLAT_HEAD_SCREW1_D / 2, CSK_FOR_M2_COUNTERSUNK_FLAT_HEAD_SCREW1_CSINK_D / 2, counter_sink_angle=CSK_FOR_M2_COUNTERSUNK_FLAT_HEAD_SCREW1_CSINK_ANGLE)


solid = part.part
